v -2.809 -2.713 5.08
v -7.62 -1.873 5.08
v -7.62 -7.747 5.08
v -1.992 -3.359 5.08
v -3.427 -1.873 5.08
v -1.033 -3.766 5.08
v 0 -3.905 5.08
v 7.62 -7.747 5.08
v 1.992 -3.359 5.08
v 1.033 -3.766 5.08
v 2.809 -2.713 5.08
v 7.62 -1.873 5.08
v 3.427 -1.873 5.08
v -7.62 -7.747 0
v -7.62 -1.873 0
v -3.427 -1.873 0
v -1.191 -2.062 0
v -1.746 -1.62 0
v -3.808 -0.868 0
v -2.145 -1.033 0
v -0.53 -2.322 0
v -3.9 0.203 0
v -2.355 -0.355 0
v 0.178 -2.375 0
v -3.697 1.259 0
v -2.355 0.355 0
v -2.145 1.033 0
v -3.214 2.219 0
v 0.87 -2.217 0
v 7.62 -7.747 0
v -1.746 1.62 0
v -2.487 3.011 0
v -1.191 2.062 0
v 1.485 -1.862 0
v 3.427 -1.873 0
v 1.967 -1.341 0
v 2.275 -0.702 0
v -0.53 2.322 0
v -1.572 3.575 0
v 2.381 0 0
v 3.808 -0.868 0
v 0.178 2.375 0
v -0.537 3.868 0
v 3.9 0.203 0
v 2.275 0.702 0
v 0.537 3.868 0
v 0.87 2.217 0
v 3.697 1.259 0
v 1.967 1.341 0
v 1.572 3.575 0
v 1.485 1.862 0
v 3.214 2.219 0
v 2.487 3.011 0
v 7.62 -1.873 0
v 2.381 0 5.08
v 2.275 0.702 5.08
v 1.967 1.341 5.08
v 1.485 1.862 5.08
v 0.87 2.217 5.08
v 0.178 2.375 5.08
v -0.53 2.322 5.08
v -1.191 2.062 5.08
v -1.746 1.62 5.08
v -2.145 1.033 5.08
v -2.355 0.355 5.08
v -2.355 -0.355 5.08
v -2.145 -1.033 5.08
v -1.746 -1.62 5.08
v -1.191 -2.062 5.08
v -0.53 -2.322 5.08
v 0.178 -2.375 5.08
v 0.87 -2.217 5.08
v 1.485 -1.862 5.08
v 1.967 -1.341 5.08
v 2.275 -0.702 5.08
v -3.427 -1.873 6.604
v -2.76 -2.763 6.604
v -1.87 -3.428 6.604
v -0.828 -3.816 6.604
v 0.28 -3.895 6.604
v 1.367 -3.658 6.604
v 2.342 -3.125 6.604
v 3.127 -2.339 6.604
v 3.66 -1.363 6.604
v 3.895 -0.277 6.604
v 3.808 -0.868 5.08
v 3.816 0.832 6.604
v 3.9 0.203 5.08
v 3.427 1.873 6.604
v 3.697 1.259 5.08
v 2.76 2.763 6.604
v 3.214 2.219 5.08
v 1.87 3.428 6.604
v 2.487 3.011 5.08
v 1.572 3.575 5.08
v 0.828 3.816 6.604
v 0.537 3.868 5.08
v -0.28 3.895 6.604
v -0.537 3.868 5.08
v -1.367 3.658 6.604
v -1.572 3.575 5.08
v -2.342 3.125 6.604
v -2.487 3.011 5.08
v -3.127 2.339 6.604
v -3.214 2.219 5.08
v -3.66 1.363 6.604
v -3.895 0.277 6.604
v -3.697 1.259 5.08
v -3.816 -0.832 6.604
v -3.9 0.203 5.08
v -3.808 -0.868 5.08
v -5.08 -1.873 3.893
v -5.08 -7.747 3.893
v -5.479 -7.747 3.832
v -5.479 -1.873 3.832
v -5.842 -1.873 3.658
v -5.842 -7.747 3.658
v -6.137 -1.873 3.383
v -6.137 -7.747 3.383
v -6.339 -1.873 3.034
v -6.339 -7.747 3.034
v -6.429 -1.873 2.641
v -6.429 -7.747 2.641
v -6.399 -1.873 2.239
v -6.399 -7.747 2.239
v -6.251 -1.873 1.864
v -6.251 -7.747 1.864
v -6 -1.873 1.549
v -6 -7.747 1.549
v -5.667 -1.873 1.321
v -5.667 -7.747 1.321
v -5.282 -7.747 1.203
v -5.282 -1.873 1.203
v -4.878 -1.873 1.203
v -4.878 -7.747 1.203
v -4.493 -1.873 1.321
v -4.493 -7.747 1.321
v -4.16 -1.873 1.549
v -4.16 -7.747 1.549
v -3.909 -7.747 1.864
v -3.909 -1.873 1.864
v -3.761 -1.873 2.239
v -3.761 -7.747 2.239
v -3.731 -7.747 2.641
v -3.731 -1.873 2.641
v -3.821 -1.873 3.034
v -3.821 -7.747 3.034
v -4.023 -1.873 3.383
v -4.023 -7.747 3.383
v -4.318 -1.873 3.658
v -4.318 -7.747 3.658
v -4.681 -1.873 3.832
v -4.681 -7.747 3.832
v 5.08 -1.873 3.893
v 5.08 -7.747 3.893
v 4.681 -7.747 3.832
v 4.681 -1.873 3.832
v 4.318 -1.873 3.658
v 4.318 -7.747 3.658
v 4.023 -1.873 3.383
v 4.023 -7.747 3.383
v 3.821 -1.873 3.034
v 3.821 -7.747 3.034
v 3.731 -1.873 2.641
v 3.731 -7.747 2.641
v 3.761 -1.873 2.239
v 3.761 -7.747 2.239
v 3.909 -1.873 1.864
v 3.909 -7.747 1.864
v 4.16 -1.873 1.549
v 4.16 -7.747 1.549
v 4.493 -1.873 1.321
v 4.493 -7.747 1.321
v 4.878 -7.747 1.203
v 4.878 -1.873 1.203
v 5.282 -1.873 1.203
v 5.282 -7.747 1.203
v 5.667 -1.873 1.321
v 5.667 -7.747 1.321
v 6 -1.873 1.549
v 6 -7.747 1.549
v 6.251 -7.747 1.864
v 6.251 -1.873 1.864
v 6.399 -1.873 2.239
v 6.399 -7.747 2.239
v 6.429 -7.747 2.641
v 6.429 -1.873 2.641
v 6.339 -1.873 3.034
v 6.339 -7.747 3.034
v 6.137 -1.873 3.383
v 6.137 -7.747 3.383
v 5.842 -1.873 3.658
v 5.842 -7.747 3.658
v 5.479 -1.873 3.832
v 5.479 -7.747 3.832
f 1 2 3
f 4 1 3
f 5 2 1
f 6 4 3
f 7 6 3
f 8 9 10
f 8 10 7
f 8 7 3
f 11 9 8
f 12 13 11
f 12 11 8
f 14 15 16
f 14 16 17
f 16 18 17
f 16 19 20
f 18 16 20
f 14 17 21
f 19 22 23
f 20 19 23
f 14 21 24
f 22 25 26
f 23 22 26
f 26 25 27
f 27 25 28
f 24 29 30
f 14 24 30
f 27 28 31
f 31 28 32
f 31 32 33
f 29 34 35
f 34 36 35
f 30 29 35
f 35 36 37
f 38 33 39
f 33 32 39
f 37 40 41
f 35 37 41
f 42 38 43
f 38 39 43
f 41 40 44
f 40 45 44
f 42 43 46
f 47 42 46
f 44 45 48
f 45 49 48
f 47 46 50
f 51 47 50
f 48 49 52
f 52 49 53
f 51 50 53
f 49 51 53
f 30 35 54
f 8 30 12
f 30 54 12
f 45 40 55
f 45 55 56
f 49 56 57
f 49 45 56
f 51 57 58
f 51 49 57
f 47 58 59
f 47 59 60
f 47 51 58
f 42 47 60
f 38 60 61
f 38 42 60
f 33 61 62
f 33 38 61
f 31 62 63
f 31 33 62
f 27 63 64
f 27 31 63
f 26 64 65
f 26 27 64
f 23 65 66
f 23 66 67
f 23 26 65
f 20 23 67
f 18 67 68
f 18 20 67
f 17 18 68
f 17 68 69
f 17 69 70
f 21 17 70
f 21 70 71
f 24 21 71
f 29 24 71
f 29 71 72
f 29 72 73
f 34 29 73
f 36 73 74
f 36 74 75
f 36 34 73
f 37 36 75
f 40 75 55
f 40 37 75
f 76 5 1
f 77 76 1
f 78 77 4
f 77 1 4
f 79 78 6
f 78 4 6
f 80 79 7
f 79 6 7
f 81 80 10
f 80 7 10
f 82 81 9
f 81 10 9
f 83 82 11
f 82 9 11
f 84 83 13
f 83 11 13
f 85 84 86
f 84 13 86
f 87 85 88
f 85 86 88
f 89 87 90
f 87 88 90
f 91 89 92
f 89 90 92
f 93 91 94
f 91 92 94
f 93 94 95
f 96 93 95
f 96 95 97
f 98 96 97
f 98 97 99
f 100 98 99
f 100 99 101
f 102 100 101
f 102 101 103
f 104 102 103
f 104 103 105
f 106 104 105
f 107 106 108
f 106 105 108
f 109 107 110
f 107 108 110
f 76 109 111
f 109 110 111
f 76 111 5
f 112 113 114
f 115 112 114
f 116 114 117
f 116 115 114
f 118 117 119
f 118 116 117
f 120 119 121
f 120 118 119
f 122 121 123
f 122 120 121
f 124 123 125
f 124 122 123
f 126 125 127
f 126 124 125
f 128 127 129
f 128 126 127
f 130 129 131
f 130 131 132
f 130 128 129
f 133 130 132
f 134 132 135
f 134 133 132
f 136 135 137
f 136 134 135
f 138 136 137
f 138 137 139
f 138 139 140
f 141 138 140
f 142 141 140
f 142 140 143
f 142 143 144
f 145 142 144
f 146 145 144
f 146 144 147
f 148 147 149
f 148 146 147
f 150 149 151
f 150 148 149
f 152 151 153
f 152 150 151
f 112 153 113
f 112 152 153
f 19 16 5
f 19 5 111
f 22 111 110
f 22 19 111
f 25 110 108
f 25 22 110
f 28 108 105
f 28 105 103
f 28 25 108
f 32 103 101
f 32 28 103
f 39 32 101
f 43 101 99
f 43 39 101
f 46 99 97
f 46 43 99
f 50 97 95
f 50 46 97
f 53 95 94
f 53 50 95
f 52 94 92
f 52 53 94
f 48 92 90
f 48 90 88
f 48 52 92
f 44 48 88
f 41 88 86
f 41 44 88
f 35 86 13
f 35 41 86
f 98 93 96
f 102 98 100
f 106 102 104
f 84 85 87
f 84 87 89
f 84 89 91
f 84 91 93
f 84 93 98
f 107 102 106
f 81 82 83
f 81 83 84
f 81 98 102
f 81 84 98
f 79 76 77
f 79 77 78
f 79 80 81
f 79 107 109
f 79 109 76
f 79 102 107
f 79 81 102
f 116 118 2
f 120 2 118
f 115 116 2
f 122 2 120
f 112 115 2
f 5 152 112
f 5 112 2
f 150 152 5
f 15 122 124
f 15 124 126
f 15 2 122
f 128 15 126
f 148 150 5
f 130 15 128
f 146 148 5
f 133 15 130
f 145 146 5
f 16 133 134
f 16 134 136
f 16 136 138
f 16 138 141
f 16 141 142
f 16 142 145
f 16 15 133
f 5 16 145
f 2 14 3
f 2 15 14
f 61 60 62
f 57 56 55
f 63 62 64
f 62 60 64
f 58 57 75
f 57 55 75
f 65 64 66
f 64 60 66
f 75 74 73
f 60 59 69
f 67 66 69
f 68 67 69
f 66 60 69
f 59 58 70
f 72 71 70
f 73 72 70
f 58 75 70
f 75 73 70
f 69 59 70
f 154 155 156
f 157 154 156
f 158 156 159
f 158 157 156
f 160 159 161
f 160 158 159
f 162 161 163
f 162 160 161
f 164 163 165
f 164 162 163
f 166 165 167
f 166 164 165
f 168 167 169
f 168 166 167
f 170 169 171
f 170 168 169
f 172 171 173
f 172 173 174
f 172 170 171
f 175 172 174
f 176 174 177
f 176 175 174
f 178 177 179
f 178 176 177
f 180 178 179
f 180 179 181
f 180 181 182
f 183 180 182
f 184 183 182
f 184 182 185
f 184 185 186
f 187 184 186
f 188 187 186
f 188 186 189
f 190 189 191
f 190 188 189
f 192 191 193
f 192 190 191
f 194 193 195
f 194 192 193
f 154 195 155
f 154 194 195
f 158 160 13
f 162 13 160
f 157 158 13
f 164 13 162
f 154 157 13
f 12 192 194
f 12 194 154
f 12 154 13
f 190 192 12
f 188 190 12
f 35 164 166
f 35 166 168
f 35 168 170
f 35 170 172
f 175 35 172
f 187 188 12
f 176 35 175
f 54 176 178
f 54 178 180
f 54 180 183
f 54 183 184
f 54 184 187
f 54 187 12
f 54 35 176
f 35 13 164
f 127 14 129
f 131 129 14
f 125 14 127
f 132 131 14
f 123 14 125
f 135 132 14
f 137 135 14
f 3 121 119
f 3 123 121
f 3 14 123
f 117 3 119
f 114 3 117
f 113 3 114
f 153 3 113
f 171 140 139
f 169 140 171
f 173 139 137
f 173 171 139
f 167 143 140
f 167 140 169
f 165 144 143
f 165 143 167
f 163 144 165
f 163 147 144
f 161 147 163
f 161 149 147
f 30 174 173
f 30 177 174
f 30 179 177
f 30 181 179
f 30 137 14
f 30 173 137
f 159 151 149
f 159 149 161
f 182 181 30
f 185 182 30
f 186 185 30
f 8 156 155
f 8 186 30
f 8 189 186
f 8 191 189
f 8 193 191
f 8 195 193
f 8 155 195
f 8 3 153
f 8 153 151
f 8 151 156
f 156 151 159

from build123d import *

# Parameters (mm, degrees)
SKETCH1_R                          = 2.38125
BOSS_EXTRUDE1_DEPTH                = 5.08
SKETCH2_R                          = 3.90525
BOSS_EXTRUDE2_DEPTH                = 1.524
TAP_DRILL_FOR_6_32_TAP1_AT_2_COUNT = 2
TAP_DRILL_FOR_6_32_TAP1_AT_2_PITCH = 10.16
SKETCH6_W                          = 15.24
SKETCH6_H                          = 5.08
SKETCH6_R                          = 1.35255
BOSS_EXTRUDE3_DEPTH                = 3.84175


with BuildPart() as part:
    # Sketch1 → Boss-Extrude1 (new body)
    with BuildSketch(Plane.XY):
        with BuildLine():
            Line((0, -3.90525), (-7.62, -3.90525))
            Line((-7.62, -3.90525), (-7.62, -1.87325))
            Line((-7.62, -1.87325), (-3.426647341, -1.87325))
            ThreePointArc((-3.426647341, -1.87325), (0, 3.90525), (3.426647341, -1.87325))
            Line((3.426647341, -1.87325), (7.62, -1.87325))
            Line((7.62, -1.87325), (7.62, -3.90525))
            Line((7.62, -3.90525), (0, -3.90525))
        make_face()
        Circle(SKETCH1_R, mode=Mode.SUBTRACT)
    extrude(amount=BOSS_EXTRUDE1_DEPTH)

    # Sketch2 → Boss-Extrude2 (add)
    with BuildSketch(Plane.XY.offset(5.08)):
        with Locations(Location((0, 0, 0), (0, 0, 208.664164633))):
            Circle(SKETCH2_R)
    extrude(amount=BOSS_EXTRUDE2_DEPTH)

    # Sketch4 → Tap Drill for #6-32 Tap1 (revolve, cut)
    with BuildSketch(Plane(origin=(-5.08, -1.87325, 2.54), x_dir=(0, 0, 1), z_dir=(1, 0, 0))):
        Polygon((0, 0), (0, 8.43269403), (1.35255, 7.62), (1.35255, 0), align=None)
    tap_drill_for_6_32_tap1 = revolve(axis=Axis((-5.08, 4.47675, 2.54), (0, -1, 0)), mode=Mode.SUBTRACT)

    # Tap Drill for #6-32 Tap1 at 2: Tap Drill for #6-32 Tap1 ×2
    with Locations(*[(i * TAP_DRILL_FOR_6_32_TAP1_AT_2_PITCH, 0, 0) for i in range(1, TAP_DRILL_FOR_6_32_TAP1_AT_2_COUNT)]):
        add(tap_drill_for_6_32_tap1, mode=Mode.SUBTRACT)

    # Sketch6 → Boss-Extrude3 (add)
    with BuildSketch(Plane.XZ.offset(3.90525)):
        with Locations((0, 2.54)):
            Rectangle(SKETCH6_W, SKETCH6_H)
        with Locations(Location((-5.08, 2.54, 0), (0, 0, 90))):
            Circle(SKETCH6_R, mode=Mode.SUBTRACT)
        with Locations(Location((5.08, 2.54, 0), (0, 0, 90))):
            Circle(SKETCH6_R, mode=Mode.SUBTRACT)
    extrude(amount=BOSS_EXTRUDE3_DEPTH)


solid = part.part
